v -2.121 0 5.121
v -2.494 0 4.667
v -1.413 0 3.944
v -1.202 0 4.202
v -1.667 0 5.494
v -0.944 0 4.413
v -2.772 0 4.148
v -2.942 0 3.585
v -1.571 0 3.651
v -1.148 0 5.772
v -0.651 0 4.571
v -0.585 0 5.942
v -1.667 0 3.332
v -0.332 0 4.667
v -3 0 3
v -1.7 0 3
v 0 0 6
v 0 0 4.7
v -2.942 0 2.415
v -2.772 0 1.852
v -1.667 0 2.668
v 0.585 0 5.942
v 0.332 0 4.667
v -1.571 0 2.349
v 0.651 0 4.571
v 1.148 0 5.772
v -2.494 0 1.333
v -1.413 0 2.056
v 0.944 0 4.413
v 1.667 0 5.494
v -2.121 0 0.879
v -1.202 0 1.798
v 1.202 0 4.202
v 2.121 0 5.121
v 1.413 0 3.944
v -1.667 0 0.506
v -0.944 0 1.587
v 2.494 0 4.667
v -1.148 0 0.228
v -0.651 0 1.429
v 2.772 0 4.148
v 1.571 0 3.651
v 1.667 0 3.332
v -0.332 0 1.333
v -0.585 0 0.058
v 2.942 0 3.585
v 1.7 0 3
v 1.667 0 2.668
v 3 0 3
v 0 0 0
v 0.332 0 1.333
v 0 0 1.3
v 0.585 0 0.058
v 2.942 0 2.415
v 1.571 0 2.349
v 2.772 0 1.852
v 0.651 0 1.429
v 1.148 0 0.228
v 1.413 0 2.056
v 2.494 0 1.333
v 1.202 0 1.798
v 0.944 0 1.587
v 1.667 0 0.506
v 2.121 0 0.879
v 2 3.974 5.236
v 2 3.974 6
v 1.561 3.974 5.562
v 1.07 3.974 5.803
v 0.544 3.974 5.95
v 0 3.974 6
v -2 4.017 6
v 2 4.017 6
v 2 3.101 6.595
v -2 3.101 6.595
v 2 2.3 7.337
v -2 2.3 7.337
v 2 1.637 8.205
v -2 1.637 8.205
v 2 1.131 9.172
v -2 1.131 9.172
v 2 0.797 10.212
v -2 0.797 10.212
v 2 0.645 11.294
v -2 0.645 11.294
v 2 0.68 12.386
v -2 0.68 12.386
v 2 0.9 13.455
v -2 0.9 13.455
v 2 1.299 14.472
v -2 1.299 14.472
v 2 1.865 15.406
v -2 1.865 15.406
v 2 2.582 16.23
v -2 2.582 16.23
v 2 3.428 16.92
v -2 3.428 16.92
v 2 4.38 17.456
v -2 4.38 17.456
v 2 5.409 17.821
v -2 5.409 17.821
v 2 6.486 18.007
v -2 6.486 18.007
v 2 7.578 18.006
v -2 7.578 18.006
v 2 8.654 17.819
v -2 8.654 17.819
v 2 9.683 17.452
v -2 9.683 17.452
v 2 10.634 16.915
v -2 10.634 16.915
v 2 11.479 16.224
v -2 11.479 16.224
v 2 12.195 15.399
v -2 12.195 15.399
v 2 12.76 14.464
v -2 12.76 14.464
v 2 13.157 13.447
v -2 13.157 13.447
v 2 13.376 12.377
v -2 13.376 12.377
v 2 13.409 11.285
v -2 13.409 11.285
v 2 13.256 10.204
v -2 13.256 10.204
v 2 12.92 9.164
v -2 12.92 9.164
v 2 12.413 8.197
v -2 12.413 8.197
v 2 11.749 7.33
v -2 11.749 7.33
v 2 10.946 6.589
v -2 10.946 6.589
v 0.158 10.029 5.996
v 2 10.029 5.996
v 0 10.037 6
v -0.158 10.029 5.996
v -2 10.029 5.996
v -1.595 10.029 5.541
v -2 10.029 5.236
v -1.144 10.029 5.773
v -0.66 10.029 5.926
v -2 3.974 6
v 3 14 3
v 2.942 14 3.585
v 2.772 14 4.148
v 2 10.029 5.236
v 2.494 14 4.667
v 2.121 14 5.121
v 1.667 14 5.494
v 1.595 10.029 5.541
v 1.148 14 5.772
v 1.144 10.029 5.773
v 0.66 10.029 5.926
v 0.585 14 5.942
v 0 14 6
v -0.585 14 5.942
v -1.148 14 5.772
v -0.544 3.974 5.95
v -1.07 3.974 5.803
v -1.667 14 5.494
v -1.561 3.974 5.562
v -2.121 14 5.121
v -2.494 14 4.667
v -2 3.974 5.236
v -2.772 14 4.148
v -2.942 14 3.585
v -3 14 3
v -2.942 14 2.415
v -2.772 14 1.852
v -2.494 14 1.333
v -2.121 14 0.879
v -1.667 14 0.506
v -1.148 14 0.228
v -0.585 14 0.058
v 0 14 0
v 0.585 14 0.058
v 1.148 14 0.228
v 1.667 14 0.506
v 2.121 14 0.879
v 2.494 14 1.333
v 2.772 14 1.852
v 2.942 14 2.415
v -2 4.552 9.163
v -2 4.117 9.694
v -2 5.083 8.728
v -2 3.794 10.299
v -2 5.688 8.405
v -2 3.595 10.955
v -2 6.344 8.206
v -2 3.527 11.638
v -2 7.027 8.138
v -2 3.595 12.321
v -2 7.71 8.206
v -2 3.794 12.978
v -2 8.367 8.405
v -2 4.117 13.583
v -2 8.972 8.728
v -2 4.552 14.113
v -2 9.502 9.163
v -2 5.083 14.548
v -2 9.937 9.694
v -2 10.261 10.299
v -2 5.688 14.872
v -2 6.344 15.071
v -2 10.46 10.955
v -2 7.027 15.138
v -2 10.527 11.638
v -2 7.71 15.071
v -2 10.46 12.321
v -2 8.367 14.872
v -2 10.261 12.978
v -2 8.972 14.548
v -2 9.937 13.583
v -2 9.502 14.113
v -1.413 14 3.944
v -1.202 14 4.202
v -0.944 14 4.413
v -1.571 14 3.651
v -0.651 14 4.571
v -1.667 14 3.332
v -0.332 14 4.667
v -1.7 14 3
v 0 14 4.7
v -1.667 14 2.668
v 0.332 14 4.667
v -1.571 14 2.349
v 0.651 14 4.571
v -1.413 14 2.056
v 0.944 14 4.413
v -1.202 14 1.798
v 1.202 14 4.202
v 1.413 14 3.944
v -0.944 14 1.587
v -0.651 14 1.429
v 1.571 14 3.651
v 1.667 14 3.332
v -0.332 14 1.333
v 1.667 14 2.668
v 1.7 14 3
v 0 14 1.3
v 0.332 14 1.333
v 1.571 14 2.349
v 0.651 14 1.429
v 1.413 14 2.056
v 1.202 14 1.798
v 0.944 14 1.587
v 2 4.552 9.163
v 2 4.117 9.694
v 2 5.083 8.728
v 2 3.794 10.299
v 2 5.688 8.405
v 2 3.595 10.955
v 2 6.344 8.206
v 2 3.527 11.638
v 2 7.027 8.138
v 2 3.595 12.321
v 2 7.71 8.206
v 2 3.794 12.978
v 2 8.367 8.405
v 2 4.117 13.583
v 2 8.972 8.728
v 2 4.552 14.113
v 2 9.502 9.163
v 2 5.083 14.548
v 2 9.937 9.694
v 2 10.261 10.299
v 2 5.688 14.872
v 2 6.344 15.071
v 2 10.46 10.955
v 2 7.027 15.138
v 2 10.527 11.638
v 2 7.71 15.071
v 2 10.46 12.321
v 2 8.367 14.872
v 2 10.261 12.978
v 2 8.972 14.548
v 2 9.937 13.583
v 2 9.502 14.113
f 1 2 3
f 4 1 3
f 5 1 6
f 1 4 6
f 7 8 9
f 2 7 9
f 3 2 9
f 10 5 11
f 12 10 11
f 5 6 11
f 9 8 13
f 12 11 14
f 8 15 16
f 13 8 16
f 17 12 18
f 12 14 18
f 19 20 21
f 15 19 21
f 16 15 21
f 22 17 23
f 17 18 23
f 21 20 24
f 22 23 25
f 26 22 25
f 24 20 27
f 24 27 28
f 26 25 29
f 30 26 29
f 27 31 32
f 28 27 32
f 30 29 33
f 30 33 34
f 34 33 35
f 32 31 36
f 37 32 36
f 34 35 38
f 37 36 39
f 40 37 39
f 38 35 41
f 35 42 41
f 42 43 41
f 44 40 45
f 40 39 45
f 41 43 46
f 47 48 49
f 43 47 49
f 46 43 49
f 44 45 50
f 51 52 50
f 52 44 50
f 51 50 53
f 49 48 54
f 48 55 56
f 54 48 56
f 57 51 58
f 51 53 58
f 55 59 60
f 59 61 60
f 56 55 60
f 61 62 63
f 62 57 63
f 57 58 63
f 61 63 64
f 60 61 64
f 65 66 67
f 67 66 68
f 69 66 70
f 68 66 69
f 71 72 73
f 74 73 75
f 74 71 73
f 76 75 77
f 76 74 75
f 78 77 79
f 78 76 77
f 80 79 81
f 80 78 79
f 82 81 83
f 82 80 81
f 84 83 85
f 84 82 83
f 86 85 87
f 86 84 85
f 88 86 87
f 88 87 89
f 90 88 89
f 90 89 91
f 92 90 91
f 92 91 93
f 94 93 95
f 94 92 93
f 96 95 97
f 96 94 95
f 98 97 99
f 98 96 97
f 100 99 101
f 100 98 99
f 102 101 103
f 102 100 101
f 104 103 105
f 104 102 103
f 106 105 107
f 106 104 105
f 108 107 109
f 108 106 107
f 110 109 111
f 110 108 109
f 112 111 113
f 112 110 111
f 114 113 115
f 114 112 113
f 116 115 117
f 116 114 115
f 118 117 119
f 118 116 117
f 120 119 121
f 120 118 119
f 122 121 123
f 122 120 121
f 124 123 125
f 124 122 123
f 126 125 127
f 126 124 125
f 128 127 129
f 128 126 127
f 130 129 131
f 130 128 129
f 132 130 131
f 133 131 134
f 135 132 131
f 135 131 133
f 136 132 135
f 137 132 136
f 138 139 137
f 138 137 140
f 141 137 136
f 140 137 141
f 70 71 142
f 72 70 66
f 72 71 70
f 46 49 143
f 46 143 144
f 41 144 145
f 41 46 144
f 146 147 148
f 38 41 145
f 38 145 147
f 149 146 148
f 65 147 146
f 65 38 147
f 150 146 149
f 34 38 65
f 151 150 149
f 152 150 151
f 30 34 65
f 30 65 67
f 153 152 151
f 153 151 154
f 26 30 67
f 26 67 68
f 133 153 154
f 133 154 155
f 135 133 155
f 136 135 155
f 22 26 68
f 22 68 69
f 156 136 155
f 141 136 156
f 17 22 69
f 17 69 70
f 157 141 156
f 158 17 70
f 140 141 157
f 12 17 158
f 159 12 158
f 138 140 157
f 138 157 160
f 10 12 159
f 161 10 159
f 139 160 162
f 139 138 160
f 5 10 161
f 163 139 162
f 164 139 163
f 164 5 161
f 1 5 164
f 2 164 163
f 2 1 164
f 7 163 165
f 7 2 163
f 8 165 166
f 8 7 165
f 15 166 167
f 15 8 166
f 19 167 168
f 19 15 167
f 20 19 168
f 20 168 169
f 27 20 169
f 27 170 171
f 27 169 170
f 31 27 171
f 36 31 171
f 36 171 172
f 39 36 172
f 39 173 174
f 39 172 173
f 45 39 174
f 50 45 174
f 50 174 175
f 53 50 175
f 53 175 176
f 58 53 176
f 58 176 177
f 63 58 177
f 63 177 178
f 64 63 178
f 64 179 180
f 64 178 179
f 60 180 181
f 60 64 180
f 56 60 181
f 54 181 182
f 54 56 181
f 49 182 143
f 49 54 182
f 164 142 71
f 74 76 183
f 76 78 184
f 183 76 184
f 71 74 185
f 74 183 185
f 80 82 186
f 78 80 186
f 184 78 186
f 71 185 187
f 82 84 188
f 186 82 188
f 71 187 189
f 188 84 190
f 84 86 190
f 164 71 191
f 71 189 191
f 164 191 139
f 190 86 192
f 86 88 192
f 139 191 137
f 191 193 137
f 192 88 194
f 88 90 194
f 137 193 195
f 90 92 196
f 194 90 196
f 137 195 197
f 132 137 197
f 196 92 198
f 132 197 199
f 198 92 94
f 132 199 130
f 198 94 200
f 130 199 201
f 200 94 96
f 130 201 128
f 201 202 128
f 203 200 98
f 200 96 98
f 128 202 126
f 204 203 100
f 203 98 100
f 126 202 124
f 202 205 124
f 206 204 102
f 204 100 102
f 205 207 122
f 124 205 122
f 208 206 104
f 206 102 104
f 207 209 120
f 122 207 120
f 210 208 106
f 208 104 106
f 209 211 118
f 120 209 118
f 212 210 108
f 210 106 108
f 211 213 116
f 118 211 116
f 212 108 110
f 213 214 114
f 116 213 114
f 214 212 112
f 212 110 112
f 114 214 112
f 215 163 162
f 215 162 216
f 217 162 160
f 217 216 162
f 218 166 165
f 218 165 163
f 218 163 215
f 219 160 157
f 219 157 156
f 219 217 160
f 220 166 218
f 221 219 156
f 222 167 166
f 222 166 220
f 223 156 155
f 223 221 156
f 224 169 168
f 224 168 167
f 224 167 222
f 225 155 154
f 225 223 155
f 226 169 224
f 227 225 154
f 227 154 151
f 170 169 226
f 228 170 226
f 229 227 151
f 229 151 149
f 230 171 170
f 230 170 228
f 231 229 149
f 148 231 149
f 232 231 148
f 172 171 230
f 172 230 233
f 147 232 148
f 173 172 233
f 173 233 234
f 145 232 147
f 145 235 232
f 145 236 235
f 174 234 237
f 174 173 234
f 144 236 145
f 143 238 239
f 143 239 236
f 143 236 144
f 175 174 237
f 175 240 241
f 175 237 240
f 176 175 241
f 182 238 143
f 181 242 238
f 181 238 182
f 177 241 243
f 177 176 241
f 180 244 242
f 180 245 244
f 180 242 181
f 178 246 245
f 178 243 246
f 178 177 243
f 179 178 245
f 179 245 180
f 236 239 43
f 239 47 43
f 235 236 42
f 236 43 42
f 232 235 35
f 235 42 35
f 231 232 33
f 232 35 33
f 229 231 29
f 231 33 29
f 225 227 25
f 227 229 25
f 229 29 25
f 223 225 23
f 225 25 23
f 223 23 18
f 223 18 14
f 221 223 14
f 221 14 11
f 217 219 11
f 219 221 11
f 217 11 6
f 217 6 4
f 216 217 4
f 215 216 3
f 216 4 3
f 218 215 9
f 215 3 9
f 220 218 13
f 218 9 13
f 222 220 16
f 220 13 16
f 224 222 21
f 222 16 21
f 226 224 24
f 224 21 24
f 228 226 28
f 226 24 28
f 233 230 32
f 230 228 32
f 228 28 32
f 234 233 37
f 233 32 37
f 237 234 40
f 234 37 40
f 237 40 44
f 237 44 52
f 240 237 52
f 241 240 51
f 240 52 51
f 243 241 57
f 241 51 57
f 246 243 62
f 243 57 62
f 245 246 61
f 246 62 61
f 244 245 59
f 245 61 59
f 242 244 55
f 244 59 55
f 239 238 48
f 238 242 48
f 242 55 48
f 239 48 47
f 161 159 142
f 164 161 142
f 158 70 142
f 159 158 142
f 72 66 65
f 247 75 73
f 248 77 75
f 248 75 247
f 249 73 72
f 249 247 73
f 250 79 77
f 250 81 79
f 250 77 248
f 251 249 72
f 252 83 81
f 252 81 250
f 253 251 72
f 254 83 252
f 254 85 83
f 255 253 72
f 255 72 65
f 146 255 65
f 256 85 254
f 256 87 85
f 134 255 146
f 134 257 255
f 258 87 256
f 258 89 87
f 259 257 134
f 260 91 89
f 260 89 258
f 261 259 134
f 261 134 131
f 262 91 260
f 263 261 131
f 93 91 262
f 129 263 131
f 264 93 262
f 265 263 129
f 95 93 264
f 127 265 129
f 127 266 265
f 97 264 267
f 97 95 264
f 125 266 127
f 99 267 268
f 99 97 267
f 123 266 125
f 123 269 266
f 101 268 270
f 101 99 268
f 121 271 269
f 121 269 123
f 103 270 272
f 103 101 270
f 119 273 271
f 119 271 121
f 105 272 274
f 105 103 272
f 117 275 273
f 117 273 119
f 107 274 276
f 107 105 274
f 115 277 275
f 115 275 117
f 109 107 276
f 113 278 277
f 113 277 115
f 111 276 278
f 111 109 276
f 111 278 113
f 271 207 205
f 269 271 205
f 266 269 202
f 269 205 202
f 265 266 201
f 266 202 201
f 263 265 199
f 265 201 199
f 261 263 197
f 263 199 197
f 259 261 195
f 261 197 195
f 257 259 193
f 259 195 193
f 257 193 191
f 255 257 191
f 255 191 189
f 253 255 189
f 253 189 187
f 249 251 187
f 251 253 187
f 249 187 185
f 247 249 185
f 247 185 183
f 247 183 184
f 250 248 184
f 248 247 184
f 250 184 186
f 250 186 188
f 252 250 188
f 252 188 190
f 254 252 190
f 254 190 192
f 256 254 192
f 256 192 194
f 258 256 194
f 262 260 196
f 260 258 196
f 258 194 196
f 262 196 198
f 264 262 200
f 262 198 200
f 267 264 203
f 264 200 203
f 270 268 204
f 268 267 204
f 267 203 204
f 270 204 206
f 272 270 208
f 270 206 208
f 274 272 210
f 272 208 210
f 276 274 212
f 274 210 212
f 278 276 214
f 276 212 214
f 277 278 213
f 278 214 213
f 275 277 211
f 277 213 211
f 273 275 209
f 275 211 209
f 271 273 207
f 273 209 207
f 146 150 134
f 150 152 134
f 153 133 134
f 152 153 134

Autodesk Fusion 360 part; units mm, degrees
sketch "Sketch1" plane through (0, 0, 0) normal (0, 1, 0) x (1, 0, 0)
  circle A0 centre (0, -3) radius 3
  circle A1 centre (0, -3) radius 1.7
  dimension "d1" = 3.4
extrude "Extrude1" add sketch "Sketch1" along normal blind 14
sketch "Sketch2" plane through (0, 0, 0) normal (0, 0, 1) x (1, 0, 0)
ref_plane "WorkPlane1" through (0, 0, 6) normal (0, 0, 1) x (1, 0, 0)
sketch "Sketch3" plane through (0, 0, 6) normal (0, 0, 1) x (1, 0, 0)
  line L0 (-2, 10.0294) -> (2, 10.0294)
  line L1 (2, 10.0294) -> (2, 3.9745)
  line L2 (2, 3.9745) -> (-2, 3.9745)
  line L3 (-2, 3.9745) -> (-2, 10.0294)
extrude "Extrude2" add sketch "Sketch3" against normal blind 1
ref_plane "WorkPlane2" through (-2, 0, 0) normal (1, 0, 0) x (0, 1, 0)
sketch "Sketch4" plane through (-2, 0, 0) normal (1, 0, 0) x (0, 1, 0)
  circle A0 centre (7.0273, 11.6383) radius 6.3914
  circle A1 centre (7.0273, 11.6383) radius 3.5
  dimension "d8" = 7
extrude "Extrude3" add sketch "Sketch4" along normal blind 4
